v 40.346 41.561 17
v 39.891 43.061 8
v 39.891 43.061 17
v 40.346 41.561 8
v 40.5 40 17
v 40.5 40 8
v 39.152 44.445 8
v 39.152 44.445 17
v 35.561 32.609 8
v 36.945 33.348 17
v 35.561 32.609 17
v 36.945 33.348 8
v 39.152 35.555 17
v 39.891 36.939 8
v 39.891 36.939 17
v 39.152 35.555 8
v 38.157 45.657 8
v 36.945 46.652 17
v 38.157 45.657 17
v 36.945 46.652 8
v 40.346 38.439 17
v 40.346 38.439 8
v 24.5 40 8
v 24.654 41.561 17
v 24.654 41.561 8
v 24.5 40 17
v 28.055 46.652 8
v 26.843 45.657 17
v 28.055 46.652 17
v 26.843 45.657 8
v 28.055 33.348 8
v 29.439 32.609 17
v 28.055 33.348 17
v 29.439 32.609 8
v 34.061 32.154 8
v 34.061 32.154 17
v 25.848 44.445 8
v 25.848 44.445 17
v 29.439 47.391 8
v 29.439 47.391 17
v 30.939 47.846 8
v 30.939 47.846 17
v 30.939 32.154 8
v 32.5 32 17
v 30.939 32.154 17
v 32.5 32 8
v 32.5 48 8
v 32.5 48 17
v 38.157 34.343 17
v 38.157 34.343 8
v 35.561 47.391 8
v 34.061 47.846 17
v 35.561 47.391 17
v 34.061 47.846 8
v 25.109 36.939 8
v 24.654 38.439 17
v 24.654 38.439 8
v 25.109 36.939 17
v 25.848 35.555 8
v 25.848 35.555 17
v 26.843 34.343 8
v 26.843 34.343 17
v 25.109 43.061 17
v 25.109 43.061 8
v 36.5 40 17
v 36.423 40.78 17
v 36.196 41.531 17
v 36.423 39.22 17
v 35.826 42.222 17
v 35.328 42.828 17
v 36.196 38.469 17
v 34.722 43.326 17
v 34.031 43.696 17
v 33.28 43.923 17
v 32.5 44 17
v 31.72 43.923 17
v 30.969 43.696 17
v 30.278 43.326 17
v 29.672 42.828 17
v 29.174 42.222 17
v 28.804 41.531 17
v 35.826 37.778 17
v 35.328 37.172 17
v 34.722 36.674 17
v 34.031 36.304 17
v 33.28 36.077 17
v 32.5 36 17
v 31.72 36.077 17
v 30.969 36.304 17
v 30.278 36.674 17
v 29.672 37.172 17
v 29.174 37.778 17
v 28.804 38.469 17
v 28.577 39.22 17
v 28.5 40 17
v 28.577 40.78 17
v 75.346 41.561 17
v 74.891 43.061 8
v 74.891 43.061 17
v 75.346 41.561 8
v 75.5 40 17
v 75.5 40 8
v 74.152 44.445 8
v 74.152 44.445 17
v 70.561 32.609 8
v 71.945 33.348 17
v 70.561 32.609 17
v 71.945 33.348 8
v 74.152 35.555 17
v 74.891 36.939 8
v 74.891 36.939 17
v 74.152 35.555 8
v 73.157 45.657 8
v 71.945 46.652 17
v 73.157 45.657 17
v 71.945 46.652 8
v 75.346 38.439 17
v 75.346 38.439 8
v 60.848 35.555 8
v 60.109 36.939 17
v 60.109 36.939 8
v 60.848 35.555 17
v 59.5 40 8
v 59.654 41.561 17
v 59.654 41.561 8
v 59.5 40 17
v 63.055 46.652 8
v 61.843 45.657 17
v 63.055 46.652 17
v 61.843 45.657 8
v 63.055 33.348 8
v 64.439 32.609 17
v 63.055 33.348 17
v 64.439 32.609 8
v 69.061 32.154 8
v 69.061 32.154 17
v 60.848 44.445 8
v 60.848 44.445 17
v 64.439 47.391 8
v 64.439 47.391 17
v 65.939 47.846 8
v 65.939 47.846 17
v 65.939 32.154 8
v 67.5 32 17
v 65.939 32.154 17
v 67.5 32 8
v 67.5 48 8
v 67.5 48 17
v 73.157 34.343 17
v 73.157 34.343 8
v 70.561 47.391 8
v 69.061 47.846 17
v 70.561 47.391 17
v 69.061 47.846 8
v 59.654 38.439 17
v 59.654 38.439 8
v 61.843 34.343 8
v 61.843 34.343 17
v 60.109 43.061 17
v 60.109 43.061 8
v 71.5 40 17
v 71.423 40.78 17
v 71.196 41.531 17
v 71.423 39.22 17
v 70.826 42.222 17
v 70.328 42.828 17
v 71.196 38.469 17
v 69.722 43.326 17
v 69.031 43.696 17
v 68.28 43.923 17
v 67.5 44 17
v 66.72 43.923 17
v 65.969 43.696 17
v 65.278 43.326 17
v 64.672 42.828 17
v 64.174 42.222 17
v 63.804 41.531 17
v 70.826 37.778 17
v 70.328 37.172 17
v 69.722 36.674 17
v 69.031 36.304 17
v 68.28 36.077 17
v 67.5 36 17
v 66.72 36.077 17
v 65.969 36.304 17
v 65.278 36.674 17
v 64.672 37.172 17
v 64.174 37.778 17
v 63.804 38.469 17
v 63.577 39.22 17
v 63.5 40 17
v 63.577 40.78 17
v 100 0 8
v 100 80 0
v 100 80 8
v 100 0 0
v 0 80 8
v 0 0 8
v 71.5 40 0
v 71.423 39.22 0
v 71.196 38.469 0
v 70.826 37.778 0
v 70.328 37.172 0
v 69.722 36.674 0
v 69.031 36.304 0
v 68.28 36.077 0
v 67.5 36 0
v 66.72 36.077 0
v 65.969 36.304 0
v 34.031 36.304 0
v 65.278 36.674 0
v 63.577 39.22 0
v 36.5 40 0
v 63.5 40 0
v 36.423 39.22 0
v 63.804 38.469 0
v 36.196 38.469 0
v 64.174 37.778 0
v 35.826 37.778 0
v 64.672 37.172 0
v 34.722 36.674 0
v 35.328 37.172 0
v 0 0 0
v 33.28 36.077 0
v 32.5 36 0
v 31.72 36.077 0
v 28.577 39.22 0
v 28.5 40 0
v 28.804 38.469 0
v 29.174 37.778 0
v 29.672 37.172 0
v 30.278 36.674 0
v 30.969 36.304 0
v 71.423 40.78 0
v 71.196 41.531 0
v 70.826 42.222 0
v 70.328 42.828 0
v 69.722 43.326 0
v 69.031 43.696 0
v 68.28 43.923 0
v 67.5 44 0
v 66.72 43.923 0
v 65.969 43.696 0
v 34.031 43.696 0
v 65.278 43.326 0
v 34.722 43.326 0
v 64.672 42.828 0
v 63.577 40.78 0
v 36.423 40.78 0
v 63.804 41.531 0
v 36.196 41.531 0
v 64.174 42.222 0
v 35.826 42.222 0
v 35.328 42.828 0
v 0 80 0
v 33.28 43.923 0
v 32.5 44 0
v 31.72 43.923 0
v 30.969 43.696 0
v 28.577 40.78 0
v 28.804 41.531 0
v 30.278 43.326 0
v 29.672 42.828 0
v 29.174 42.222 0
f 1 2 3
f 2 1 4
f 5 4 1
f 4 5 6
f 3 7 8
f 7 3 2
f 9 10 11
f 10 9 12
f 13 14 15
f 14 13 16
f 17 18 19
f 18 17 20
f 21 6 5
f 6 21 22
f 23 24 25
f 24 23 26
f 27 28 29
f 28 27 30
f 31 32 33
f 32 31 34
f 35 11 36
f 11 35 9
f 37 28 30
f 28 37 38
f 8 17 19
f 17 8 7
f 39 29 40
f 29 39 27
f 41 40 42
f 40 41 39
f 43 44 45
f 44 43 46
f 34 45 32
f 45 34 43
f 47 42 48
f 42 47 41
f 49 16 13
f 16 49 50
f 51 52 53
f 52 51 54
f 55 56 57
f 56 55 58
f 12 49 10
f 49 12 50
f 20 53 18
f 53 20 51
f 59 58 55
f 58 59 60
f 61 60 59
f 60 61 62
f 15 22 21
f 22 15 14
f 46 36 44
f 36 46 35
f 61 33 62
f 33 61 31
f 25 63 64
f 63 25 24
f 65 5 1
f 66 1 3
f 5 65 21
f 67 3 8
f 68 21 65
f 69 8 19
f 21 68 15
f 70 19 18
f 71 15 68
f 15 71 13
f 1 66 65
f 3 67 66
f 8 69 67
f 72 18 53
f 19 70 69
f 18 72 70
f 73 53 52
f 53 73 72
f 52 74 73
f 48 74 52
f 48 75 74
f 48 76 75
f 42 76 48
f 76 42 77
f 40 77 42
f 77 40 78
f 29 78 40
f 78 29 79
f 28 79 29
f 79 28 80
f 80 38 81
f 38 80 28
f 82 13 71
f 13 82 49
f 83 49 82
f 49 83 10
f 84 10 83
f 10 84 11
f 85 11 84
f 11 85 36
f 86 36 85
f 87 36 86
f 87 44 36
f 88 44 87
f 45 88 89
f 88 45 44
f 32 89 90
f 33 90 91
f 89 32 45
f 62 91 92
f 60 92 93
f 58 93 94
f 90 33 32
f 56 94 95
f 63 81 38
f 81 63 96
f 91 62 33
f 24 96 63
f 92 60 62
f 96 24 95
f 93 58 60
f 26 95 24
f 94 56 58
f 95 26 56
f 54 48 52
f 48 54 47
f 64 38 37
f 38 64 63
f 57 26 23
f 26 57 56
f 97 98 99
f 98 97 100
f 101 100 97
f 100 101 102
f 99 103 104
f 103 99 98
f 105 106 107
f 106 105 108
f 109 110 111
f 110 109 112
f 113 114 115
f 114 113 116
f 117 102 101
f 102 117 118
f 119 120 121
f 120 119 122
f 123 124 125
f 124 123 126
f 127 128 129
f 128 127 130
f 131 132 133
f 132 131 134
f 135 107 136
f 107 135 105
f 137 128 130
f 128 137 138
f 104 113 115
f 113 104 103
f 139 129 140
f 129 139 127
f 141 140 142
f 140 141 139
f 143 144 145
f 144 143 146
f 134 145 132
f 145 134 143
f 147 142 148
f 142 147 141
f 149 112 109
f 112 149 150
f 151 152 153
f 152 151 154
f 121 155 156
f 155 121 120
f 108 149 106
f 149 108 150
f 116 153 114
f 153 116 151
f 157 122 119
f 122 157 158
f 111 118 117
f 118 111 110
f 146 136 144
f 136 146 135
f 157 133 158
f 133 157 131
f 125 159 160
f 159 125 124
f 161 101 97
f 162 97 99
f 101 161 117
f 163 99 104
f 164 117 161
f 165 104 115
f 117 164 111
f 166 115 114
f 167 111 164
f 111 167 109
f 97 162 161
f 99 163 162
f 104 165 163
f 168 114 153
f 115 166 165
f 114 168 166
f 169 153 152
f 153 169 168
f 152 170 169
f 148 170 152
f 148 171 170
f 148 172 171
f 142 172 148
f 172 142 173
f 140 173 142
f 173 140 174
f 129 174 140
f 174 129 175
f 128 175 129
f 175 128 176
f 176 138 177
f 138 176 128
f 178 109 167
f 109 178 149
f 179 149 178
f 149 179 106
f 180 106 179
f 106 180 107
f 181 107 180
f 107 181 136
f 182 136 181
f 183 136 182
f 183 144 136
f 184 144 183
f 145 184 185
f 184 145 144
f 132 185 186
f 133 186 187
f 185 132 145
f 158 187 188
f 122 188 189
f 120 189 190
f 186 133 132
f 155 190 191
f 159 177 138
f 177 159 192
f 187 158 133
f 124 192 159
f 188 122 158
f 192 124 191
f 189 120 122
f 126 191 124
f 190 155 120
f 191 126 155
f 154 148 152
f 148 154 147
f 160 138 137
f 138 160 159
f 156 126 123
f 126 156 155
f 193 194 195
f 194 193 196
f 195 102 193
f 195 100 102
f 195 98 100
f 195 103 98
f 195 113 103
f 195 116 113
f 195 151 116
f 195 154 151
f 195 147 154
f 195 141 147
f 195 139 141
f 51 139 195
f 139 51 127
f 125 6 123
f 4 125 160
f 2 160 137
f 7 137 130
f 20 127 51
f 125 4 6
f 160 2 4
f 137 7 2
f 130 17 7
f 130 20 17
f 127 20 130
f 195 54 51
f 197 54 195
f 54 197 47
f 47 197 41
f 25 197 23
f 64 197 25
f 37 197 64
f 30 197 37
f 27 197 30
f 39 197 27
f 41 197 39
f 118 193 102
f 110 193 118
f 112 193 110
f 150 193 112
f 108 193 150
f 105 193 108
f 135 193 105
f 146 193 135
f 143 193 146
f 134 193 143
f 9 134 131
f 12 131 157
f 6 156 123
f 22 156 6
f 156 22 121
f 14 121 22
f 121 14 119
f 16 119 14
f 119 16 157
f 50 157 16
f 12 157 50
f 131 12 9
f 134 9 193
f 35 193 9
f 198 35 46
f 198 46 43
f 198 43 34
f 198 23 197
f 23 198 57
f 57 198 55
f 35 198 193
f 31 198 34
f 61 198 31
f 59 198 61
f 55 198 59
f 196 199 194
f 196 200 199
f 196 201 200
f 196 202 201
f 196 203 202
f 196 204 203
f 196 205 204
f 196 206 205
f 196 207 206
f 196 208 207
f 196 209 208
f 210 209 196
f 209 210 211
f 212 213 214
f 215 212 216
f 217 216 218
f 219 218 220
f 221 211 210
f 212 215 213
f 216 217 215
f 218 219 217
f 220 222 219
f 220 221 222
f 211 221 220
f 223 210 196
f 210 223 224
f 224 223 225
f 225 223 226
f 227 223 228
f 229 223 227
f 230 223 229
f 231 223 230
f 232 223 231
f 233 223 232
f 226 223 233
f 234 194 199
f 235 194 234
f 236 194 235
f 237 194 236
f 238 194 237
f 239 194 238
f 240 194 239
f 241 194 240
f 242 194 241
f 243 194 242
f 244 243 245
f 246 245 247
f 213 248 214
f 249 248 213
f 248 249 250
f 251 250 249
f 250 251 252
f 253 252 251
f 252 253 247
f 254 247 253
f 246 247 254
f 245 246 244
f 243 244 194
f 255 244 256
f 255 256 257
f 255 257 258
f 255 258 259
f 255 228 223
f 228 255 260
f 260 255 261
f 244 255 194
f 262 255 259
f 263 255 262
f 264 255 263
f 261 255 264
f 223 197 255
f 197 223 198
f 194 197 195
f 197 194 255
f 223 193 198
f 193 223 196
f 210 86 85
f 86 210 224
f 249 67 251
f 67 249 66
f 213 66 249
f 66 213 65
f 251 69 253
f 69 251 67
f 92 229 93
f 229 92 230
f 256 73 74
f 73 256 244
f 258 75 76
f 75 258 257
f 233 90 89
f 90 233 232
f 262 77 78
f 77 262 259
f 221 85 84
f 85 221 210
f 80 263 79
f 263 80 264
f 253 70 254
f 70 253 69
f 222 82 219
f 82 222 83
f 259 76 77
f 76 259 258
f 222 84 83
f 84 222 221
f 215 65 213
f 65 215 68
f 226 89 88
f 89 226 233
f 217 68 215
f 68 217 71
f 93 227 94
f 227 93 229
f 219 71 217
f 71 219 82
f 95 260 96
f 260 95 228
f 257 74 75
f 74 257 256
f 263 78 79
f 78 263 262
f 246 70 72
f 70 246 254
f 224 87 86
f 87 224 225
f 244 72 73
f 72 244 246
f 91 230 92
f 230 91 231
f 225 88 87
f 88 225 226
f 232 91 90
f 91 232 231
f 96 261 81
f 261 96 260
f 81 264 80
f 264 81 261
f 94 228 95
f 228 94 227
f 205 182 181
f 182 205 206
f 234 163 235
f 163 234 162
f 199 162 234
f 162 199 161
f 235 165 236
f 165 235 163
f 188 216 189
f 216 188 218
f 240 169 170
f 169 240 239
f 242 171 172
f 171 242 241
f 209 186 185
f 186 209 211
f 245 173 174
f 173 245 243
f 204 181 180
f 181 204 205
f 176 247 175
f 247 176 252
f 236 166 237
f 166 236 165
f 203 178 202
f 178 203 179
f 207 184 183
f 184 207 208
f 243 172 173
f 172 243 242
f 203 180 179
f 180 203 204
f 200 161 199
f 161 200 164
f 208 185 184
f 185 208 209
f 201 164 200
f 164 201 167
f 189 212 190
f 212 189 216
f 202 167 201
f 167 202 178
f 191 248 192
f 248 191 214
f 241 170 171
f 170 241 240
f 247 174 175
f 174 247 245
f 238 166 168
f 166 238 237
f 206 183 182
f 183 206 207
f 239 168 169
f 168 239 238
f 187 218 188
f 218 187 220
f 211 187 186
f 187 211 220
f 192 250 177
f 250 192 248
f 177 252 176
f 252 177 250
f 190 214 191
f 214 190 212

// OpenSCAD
$fn = 32;

// ----------------------------------------------------------------------
// Drill jig: two_boss jig
// ----------------------------------------------------------------------

// --- parameters (mm) ---
plate_l = 100;            // plate length, X
plate_w = 80;             // plate width, Y
plate_t = 8;              // plate thickness
boss_d = 16;              // guide boss diameter
boss_h = 10;              // boss height above the plate
guide_d = 8;              // guide hole diameter
boss_pitch = 35;          // boss pitch

n_boss = 2;  // guide bosses
boss_x0 = (plate_l - (n_boss - 1) * boss_pitch) / 2;  // first boss X
boss_top = plate_t - 1 + boss_h;  // boss crown height
total_h = boss_top;  // overall height

difference() {
  union() {
  cube([plate_l, plate_w, plate_t]);
  for (i = [0 : n_boss - 1])
    translate([boss_x0 + i * boss_pitch, plate_w / 2, plate_t - 1])
      cylinder(h = boss_h, d = boss_d);
  }
  for (i = [0 : n_boss - 1])
    translate([boss_x0 + i * boss_pitch, plate_w / 2, -1])
      cylinder(h = plate_t + boss_h, d = guide_d);
}
